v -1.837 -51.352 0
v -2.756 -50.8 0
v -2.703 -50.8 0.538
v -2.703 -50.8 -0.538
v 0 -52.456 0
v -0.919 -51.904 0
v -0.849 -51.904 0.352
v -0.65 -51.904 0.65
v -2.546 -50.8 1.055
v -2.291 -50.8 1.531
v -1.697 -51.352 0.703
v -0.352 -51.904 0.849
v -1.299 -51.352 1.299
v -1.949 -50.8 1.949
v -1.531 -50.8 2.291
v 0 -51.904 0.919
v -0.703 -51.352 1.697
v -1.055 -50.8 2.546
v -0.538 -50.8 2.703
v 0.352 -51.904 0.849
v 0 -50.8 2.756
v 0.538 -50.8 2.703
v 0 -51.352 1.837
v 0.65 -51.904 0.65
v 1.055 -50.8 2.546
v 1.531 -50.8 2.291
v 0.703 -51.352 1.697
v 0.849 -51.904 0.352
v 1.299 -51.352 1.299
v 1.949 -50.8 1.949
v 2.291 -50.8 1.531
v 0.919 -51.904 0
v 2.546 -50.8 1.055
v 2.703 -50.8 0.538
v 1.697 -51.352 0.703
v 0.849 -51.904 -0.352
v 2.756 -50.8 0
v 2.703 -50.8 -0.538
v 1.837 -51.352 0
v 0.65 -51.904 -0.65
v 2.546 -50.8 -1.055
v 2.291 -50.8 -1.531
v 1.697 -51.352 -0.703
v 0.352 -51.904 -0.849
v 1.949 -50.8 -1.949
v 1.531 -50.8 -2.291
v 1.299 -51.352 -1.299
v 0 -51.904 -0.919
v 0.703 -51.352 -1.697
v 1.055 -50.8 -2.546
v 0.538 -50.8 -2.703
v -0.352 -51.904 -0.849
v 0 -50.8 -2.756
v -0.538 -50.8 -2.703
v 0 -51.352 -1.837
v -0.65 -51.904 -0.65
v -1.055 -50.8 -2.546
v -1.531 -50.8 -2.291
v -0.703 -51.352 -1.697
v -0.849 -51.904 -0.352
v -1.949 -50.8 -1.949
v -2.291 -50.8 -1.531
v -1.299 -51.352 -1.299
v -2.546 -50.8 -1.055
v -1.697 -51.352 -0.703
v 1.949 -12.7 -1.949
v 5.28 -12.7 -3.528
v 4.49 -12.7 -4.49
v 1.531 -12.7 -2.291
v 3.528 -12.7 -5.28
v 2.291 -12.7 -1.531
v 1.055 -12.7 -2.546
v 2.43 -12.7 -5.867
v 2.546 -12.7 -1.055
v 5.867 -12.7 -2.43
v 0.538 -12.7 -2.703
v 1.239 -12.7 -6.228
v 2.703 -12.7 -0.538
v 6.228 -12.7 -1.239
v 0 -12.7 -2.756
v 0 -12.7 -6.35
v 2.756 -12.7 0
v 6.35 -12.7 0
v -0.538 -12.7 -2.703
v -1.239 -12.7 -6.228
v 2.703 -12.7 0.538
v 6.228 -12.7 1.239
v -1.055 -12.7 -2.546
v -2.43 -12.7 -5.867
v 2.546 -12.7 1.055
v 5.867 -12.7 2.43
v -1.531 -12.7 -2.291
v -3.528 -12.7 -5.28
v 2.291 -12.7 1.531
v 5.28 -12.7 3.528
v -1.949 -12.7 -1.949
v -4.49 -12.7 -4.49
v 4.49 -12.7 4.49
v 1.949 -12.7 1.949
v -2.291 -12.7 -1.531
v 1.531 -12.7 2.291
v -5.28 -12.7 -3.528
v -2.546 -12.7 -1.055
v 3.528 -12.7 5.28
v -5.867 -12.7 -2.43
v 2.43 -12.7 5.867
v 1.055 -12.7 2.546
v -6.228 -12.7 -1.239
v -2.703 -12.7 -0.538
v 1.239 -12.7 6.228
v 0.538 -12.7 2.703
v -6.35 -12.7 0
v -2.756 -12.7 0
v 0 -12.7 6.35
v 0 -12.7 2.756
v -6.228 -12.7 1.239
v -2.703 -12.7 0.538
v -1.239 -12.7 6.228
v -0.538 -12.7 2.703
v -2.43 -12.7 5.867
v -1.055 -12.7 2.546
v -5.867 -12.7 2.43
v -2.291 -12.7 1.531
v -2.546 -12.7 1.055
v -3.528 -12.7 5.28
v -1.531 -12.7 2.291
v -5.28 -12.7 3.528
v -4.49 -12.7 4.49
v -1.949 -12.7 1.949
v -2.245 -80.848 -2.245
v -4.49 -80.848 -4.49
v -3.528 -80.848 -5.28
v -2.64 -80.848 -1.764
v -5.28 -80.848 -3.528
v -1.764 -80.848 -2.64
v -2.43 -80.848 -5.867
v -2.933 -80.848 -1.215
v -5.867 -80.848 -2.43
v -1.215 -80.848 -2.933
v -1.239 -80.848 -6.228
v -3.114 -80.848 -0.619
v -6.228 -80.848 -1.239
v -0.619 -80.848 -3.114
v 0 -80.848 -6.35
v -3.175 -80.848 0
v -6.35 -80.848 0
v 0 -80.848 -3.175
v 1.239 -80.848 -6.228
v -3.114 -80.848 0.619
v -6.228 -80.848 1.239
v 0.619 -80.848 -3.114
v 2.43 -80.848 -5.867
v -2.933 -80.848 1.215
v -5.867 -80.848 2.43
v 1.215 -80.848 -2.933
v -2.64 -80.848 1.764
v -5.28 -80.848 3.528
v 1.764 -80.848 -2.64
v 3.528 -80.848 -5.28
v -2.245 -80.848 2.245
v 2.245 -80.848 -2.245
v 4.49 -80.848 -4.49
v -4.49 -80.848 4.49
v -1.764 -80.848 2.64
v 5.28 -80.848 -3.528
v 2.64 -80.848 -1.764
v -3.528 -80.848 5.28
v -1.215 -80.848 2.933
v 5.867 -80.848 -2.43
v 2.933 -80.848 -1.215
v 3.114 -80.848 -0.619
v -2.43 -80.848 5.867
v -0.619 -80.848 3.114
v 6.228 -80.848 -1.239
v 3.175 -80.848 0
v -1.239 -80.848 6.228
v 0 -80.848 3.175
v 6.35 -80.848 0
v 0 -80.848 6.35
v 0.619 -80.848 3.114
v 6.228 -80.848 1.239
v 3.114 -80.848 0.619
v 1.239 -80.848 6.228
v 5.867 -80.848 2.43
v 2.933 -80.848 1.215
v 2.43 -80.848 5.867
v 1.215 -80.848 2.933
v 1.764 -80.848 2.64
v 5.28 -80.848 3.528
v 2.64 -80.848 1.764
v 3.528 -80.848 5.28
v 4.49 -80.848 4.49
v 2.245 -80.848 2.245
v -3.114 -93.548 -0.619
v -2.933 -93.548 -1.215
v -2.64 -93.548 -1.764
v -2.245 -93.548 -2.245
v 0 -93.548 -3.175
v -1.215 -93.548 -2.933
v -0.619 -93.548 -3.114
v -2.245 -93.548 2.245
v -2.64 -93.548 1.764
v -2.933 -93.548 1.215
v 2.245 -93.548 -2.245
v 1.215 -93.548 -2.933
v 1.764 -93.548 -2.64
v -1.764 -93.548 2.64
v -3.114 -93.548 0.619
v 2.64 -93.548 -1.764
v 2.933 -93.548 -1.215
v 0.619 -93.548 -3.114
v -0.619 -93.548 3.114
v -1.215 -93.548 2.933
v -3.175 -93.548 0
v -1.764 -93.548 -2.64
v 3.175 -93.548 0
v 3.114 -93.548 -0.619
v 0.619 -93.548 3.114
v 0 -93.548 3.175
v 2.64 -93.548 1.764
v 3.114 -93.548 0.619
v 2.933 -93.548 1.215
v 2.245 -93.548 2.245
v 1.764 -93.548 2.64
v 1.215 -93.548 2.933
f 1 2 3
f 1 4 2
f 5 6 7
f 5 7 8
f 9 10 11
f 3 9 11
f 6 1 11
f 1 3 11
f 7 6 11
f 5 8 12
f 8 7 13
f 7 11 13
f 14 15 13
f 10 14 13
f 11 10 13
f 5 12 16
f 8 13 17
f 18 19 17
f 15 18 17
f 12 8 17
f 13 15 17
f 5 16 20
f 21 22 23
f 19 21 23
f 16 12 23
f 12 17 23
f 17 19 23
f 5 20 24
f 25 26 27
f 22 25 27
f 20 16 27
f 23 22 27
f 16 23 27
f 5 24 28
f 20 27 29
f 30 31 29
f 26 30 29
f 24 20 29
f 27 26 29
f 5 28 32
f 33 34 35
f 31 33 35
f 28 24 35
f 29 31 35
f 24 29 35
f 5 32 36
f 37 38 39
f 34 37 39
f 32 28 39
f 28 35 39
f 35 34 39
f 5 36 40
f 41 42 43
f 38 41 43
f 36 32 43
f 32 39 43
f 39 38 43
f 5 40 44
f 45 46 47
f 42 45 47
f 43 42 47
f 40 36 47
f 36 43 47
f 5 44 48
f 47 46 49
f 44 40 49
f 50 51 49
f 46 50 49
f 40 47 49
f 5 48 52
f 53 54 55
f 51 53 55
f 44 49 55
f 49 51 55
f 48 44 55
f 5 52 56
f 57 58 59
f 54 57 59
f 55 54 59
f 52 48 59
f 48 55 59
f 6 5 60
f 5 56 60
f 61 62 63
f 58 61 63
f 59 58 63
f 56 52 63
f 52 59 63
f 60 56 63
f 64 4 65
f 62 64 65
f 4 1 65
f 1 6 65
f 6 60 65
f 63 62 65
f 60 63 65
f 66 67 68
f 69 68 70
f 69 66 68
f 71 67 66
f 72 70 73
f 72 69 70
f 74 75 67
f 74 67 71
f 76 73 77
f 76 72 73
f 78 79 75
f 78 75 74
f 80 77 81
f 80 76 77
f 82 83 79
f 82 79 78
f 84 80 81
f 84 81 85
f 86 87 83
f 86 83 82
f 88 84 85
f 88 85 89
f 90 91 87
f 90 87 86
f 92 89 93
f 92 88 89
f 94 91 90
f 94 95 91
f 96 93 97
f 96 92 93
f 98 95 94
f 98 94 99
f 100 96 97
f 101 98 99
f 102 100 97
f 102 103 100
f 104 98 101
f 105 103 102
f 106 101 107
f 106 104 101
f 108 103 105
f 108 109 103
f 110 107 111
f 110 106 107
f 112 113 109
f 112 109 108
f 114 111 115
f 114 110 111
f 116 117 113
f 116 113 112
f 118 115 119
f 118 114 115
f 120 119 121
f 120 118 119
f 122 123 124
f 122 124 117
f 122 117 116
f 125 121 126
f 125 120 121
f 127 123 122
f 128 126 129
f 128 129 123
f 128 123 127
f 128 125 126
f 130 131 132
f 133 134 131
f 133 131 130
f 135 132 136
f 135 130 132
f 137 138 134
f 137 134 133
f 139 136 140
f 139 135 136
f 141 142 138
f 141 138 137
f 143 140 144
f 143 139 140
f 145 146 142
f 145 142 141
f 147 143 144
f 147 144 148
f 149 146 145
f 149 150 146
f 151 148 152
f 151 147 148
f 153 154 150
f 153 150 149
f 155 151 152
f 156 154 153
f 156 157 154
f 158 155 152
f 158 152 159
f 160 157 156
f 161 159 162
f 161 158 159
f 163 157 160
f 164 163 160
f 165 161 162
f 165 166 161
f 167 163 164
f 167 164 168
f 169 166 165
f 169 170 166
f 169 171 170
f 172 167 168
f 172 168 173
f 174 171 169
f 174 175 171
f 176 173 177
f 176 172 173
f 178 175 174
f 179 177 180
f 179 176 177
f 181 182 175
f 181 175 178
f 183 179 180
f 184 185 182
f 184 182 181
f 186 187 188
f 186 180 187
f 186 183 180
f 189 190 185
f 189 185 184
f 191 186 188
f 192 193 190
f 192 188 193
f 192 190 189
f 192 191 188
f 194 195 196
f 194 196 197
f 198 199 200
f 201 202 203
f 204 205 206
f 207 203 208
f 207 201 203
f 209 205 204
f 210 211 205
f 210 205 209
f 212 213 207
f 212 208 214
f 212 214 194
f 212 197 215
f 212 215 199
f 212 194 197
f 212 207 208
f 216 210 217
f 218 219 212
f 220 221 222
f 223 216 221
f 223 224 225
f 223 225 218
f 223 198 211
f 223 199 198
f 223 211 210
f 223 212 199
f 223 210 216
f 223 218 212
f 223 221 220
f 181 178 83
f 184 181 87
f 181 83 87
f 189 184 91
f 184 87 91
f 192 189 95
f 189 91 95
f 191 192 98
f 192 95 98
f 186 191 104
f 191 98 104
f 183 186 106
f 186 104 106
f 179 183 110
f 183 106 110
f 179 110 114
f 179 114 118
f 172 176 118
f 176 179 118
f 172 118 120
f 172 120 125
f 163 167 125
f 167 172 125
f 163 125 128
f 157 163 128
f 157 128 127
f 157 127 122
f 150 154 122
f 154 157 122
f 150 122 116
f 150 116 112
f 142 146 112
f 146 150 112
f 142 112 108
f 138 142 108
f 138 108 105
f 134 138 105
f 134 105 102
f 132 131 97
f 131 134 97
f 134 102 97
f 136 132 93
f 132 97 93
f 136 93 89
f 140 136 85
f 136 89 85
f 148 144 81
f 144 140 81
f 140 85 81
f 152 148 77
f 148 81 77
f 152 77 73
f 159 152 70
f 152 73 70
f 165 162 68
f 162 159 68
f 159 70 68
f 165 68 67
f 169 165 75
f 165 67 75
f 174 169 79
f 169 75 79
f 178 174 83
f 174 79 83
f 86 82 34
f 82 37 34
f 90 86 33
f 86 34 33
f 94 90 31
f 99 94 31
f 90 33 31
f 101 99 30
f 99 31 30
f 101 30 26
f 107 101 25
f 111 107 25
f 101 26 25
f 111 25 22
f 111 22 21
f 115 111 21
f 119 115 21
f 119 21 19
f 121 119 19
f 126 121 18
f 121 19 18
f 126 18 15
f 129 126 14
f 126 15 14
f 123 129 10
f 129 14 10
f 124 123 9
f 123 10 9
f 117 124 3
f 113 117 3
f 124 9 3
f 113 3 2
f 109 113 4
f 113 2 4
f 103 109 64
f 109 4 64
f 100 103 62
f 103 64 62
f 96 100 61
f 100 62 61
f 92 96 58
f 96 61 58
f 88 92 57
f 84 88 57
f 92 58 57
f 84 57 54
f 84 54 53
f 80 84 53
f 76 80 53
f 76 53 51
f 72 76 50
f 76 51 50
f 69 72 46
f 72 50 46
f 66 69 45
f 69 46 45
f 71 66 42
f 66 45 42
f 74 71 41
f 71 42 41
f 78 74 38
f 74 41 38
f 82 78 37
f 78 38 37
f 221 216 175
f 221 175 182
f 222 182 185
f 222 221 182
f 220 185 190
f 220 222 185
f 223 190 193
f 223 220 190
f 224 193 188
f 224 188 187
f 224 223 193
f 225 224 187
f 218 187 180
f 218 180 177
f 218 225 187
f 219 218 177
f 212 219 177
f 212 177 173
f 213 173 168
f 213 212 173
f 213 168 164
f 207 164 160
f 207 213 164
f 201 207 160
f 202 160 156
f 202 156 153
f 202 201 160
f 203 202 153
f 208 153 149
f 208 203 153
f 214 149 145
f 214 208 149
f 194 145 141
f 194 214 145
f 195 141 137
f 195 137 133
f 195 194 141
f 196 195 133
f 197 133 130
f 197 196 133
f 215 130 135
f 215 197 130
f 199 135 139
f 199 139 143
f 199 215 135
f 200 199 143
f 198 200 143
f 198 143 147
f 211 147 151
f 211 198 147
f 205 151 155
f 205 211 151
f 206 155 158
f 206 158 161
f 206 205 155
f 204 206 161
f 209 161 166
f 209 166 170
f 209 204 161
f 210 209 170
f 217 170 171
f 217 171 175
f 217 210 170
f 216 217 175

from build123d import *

# Parameters (mm, degrees)
F0_R           = 6.35
F1_DEPTH       = 93.5482
F2_R           = 7.62
F2_R_2         = 3.175
F3_DEPTH       = 12.7
F5_D           = 5.5118
F5_DEPTH       = 50.8
F5_CBORE_D     = 12.7
F5_CBORE_DEPTH = 12.7
F5_TIP         = 1.65591178


with BuildPart() as f1:
    # F0 (on Front) → F1 (new body)
    with BuildSketch(Plane.XZ):
        Circle(F0_R)
    extrude(amount=F1_DEPTH)

    # F2 (on face) → F3 (cut)
    with BuildSketch(Plane.XZ.offset(93.5482)):
        Circle(F2_R)
        Circle(F2_R_2, mode=Mode.SUBTRACT)
    extrude(amount=-F3_DEPTH, mode=Mode.SUBTRACT)

    # F5
    with Locations(Plane(origin=(0, 0, 0), x_dir=(-1, 0, 0), z_dir=(0, 1, 0))):
        with Locations((0, 0)):
            CounterBoreHole(F5_D / 2, F5_CBORE_D / 2, F5_CBORE_DEPTH, depth=F5_DEPTH)
            with Locations((0, 0, -(F5_DEPTH + F5_TIP / 2))):  # 118° drill point
                Cone(0, F5_D / 2, F5_TIP, mode=Mode.SUBTRACT)


solid = f1.part
